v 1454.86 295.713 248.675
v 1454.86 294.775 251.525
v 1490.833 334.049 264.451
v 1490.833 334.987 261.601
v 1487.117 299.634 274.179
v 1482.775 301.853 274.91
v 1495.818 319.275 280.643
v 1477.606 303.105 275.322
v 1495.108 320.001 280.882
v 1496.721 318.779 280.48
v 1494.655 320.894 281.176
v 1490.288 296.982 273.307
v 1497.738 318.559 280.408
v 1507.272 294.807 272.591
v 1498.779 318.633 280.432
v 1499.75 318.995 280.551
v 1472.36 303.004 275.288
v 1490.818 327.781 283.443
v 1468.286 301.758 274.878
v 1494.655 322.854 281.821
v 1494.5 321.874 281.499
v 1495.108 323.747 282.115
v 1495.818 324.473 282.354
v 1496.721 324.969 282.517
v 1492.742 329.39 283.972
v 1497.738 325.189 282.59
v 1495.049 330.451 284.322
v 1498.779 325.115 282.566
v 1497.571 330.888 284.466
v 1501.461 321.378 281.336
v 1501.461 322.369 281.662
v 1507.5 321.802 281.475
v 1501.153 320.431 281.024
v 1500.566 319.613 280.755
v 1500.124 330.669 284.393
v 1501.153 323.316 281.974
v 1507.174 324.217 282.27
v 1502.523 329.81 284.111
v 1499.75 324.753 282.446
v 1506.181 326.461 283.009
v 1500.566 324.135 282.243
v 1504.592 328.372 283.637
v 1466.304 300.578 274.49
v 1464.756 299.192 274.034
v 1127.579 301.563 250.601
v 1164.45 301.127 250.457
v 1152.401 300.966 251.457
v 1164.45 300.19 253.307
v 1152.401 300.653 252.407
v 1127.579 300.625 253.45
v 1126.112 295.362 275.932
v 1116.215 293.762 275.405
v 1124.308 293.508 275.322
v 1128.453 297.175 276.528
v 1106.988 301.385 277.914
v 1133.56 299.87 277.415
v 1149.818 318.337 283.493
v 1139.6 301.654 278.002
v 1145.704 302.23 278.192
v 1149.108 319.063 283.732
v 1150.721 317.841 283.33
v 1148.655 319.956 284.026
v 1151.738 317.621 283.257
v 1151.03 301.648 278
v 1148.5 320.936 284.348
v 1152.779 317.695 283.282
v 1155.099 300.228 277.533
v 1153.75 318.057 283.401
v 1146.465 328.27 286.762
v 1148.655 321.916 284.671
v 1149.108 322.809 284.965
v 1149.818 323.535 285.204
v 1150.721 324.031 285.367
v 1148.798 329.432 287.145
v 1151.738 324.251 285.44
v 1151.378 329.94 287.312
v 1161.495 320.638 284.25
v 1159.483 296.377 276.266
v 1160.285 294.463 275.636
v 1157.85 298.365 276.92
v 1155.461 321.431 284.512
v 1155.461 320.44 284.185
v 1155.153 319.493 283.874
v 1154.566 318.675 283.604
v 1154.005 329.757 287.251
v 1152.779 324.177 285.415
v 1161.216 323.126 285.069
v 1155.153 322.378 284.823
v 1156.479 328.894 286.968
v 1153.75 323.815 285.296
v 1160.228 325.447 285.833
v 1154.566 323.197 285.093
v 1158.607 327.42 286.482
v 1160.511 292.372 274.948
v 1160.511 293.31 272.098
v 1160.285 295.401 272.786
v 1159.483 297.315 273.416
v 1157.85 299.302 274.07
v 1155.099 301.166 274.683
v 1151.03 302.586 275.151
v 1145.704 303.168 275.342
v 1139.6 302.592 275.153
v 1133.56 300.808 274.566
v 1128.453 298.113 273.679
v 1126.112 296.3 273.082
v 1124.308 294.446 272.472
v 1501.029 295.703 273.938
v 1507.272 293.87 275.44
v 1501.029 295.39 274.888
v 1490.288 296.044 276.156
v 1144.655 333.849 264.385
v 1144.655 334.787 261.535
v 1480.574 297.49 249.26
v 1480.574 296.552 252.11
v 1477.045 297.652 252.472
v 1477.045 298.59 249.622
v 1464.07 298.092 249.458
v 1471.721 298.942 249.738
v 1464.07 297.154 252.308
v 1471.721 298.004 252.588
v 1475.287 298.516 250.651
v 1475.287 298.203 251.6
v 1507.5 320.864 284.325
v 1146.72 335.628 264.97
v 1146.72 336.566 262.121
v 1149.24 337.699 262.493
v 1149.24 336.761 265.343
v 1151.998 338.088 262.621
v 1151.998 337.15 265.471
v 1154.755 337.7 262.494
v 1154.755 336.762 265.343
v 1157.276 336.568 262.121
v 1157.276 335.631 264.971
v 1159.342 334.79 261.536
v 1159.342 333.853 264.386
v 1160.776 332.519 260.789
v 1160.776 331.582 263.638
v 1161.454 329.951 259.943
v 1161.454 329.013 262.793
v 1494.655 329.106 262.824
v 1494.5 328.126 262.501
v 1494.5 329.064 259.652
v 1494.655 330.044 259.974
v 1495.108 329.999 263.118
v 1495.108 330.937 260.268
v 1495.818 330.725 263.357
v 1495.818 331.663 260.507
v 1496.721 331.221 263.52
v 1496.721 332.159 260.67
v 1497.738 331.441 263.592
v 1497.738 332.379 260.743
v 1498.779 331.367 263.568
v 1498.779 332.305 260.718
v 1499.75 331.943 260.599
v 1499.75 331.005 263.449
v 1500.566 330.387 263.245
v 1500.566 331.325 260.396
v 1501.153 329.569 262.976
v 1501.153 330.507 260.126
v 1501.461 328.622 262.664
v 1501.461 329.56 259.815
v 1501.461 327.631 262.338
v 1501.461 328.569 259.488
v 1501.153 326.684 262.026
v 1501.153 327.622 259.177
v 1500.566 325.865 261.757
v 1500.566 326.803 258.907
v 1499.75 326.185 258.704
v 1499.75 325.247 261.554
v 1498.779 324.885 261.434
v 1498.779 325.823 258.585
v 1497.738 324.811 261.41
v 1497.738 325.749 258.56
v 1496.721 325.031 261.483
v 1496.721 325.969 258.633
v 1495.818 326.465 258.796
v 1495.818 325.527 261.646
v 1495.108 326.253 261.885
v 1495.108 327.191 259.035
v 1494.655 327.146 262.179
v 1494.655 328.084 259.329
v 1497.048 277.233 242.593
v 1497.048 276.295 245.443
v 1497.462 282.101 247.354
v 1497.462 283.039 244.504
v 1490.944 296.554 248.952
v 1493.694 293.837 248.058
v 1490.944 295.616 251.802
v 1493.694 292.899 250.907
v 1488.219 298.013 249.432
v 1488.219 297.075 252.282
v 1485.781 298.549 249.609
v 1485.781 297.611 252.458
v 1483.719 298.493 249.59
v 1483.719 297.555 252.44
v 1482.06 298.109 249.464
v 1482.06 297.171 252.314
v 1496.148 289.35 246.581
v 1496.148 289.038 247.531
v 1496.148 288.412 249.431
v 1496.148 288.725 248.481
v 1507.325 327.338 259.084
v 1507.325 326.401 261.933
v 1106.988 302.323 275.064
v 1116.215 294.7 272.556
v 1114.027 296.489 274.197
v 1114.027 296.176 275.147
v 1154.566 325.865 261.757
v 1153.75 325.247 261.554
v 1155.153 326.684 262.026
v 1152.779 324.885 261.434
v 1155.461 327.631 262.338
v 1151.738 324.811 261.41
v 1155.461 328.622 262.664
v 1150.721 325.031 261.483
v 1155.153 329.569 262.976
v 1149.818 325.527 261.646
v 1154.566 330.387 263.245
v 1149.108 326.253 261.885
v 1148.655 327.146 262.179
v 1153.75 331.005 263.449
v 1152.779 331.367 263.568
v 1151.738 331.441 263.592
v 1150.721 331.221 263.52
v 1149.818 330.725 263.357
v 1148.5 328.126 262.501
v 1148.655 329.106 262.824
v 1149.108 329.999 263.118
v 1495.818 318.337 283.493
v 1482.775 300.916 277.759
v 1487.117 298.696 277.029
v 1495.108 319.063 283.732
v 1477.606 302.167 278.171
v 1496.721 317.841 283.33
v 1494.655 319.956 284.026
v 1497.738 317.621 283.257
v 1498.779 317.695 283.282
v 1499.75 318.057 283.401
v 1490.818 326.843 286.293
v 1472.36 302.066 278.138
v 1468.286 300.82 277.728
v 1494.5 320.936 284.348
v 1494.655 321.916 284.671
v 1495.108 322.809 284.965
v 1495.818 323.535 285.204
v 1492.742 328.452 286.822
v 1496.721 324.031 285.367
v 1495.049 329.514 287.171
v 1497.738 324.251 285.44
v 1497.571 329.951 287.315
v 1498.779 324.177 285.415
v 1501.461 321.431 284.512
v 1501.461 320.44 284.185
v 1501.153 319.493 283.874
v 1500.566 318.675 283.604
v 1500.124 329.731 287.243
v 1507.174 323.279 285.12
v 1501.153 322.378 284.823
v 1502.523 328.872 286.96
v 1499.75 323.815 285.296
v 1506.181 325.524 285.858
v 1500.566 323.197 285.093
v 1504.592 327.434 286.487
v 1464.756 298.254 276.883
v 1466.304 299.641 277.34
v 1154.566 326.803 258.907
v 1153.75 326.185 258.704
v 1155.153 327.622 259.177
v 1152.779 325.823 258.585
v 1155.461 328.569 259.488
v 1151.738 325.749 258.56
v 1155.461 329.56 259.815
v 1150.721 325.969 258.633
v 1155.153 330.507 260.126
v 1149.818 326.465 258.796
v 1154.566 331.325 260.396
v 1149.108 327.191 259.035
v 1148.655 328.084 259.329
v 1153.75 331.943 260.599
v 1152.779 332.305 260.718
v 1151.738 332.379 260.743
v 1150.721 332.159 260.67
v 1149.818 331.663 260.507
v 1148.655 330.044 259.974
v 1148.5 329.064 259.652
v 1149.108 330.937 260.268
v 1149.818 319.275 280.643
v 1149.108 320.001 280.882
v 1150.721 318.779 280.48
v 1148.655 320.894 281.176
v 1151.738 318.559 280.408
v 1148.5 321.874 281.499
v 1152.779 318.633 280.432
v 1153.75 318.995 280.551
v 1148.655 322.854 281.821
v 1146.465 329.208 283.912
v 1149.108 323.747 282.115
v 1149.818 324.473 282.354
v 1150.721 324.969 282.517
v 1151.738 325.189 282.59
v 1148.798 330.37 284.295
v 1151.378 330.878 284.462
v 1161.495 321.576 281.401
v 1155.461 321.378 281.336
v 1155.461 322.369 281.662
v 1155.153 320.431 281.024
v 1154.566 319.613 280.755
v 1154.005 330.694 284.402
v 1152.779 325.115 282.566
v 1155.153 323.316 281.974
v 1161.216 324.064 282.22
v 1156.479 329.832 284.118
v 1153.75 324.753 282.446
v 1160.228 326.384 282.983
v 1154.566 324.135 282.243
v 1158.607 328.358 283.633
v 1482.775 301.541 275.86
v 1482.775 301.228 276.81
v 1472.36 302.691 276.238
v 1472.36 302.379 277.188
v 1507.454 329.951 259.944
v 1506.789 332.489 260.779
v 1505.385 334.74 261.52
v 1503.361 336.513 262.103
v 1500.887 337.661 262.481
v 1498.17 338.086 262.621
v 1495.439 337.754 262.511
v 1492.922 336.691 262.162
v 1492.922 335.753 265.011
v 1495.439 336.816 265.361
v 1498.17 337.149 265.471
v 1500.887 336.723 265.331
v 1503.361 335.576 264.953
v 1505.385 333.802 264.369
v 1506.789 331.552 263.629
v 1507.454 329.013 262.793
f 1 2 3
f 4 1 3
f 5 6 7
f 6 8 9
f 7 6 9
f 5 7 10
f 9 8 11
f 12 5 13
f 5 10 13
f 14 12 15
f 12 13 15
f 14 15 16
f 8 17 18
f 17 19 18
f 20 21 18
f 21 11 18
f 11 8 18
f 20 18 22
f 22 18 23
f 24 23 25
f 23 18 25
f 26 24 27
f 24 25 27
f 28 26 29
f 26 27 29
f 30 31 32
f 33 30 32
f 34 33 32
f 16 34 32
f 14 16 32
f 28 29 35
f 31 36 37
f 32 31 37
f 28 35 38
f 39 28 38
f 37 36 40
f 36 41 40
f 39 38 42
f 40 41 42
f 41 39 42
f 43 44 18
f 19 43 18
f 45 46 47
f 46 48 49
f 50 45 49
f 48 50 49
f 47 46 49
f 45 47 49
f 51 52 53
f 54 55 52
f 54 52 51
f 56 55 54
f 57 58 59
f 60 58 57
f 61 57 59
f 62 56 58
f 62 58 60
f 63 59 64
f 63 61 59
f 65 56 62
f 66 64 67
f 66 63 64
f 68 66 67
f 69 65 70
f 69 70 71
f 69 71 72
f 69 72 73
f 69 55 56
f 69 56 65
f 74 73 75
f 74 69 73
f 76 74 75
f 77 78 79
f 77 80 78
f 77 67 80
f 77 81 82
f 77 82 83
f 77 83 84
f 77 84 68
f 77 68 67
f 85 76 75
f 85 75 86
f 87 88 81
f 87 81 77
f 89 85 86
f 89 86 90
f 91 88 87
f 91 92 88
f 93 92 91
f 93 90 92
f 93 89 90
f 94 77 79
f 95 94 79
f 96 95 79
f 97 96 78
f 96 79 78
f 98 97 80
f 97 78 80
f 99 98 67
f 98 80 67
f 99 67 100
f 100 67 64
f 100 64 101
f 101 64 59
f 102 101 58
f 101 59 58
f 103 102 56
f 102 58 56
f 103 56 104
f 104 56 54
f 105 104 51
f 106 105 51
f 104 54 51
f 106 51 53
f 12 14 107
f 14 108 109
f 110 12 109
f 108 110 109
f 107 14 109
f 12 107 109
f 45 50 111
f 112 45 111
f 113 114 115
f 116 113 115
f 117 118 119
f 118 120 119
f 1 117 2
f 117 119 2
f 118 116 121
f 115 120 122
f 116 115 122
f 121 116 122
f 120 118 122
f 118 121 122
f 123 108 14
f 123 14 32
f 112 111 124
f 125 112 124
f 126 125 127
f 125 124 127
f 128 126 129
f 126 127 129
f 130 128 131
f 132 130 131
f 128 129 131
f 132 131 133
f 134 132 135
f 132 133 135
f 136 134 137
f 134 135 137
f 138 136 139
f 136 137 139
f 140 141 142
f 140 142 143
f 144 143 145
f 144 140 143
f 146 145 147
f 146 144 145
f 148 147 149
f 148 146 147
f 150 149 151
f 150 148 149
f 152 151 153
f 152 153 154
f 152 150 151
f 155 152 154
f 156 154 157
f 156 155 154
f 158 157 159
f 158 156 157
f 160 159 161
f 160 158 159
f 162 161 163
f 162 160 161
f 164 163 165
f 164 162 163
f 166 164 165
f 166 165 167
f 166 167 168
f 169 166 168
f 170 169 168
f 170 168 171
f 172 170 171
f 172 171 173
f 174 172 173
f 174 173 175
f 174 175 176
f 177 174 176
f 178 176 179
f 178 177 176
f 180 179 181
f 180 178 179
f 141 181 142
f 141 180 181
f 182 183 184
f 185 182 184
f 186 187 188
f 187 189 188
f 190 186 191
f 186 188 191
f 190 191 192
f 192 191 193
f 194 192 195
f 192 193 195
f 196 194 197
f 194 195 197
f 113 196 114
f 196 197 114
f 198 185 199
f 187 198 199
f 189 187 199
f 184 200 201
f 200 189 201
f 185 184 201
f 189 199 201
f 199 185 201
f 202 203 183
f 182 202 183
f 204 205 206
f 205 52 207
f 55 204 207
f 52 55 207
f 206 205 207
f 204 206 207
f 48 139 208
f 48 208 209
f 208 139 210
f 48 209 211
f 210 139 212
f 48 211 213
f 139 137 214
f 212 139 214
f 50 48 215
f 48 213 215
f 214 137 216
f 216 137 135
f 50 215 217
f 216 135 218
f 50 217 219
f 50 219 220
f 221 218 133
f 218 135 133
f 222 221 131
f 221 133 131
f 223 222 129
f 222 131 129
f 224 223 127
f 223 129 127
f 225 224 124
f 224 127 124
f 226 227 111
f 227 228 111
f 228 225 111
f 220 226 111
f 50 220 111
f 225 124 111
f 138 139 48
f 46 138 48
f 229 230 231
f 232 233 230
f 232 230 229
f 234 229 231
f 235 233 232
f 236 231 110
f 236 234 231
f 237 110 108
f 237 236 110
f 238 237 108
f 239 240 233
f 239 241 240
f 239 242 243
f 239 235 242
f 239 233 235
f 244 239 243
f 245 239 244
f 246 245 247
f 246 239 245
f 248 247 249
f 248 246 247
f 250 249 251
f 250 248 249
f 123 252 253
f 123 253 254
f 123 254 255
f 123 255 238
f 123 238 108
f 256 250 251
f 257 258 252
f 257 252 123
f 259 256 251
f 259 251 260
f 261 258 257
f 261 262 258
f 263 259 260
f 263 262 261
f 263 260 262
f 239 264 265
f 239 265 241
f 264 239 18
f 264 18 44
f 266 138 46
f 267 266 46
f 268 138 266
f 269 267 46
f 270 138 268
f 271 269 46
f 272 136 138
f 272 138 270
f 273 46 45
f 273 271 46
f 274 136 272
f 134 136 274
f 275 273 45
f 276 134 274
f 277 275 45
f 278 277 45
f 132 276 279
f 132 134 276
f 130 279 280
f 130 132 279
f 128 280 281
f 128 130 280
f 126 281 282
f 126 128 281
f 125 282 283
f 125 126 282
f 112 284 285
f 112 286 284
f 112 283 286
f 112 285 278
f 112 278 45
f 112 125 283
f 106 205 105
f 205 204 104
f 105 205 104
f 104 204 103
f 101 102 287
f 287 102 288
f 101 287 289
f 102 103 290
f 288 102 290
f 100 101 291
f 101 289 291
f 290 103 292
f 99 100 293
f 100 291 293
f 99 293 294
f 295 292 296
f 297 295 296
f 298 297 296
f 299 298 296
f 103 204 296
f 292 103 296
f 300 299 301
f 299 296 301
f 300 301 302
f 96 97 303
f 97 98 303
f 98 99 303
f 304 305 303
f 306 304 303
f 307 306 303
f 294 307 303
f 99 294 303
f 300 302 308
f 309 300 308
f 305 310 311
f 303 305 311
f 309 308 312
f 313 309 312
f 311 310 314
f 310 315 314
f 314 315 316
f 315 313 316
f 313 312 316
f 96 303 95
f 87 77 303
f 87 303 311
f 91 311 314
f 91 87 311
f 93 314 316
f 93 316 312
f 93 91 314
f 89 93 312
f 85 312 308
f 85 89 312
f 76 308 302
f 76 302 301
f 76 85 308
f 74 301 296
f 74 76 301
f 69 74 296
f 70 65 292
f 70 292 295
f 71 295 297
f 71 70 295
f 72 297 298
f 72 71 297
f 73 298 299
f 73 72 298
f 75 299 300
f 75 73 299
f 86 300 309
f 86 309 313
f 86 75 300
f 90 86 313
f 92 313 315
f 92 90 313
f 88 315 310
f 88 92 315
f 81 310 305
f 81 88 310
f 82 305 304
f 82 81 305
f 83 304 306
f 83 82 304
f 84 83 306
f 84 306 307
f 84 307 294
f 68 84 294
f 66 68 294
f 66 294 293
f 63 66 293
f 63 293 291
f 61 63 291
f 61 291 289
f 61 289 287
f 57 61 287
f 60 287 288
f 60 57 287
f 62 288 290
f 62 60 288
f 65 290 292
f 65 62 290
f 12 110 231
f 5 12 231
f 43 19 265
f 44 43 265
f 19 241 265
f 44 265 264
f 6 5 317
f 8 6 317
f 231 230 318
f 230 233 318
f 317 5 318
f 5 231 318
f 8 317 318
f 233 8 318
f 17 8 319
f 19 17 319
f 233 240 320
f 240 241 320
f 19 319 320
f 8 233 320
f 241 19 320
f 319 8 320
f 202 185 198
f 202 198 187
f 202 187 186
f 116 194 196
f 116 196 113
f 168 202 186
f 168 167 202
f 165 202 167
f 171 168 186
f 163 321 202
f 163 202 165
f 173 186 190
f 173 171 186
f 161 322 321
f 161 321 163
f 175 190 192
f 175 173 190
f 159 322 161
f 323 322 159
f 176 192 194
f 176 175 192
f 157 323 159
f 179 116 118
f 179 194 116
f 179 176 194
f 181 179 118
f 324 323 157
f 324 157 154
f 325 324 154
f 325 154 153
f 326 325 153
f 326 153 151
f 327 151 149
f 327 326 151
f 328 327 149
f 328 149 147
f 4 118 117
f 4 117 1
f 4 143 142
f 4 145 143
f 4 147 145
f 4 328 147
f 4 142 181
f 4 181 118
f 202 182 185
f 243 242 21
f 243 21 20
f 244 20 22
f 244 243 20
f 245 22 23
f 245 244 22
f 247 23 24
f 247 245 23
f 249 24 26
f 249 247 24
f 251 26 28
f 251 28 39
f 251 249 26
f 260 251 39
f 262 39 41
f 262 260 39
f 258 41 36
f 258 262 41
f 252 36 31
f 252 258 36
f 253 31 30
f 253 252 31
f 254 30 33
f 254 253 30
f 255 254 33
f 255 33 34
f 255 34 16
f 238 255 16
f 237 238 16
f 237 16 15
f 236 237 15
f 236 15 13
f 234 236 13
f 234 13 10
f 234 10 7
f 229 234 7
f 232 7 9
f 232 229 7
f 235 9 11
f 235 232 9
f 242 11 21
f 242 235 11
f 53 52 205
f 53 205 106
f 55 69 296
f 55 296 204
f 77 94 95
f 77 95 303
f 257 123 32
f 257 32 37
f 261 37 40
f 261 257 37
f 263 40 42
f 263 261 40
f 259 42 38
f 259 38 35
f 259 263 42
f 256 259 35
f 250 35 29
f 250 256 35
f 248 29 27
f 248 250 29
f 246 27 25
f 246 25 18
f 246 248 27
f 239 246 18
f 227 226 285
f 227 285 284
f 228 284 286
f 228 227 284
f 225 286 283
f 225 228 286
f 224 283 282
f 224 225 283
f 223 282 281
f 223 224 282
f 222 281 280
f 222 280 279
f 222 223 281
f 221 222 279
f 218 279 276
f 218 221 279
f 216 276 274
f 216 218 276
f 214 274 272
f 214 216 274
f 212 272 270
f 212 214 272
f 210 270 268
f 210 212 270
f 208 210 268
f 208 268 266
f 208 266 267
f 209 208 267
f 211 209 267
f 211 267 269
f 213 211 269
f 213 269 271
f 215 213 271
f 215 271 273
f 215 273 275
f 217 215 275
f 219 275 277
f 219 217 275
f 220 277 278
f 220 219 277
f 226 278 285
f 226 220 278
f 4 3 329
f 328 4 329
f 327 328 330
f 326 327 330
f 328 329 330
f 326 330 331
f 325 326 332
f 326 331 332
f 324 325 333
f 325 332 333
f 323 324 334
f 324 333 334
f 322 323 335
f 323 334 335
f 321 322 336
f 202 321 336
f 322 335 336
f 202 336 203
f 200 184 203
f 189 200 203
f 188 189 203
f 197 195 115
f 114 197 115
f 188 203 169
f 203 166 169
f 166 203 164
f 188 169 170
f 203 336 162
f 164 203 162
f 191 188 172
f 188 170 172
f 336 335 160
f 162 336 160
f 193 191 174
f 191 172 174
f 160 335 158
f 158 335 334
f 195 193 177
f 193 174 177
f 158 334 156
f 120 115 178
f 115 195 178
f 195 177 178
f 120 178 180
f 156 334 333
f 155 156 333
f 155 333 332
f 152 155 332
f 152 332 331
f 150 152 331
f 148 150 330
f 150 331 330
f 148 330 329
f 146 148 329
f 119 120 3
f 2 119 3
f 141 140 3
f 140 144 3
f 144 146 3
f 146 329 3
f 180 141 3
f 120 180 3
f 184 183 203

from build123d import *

# Parameters (mm, degrees)
SZKIC1_R                      = 3.5
DODANIE_WYCI_GNI_CIE1_DEPTH   = 3
DODANIE_WYCI_GNI_CIE1_2_DEPTH = 3
SZKIC2_R                      = 3.5
DODANIE_WYCI_GNI_CIE2_DEPTH   = 3
DODANIE_WYCI_GNI_CIE2_2_DEPTH = 3


with BuildPart() as part:
    # Szkic1 → Dodanie-wyciągnięcie1 (new body)
    with BuildSketch(Plane(origin=(0, -45.881759644, 139.410201522), x_dir=(-1, 0, 0), z_dir=(0, 0.312617861, -0.949878978))):
        with BuildLine():
            Line((-1507.324679486, 391.926038808), (-1497.047683756, 339.176346736))
            add(Edge.make_bspline(
                [(-1497.047683756, 339.176346736), (-1500.295889417, 355.848714116), (-1491.071283731, 366.144487415), (-1480.574167069, 360.502687303)],
                knots=[0.562260196, 0.562260196, 0.562260196, 0.562260196, 1, 1, 1, 1], degree=3, weights=[0.855160957, 0.563995223, 0.612274904, 1]))
            add(Edge.make_bspline(
                [(-1480.574167069, 360.502687303), (-1475.881961605, 362.950113366), (-1466.864587333, 362.760048919), (-1454.859781154, 358.631833208)],
                knots=[0.566884898, 0.566884898, 0.566884898, 0.566884898, 0.725491645, 0.725491645, 0.725491645, 0.725491645], degree=3, weights=[0.768249126, 0.613351575, 0.525536958, 0.504805276]))
            Line((-1454.859781154, 358.631833208), (-1490.832934288, 399.978363049))
            ThreePointArc((-1490.832934288, 399.978363049), (-1502.168189741, 402.279481514), (-1507.324679486, 391.926038808))
        make_face()
        with Locations((-1497.999999998, 393.742726025)):
            Circle(SZKIC1_R, mode=Mode.SUBTRACT)
    extrude(amount=DODANIE_WYCI_GNI_CIE1_DEPTH)


with BuildPart() as body_2:
    # Szkic1 → Dodanie-wyci_gni_cie1 2 (new body)
    with BuildSketch(Plane(origin=(0, -45.881759644, 139.410201522), x_dir=(-1, 0, 0), z_dir=(0, 0.312617861, -0.949878978))):
        with BuildLine():
            Line((-1161.454019497, 394.676275891), (-1164.450401157, 364.332047192))
            add(Edge.make_bspline(
                [(-1164.450401157, 364.332047192), (-1152.611051852, 364.492579355), (-1140.312798139, 364.64531969), (-1127.578994798, 364.790268273)],
                knots=[0.951482823, 0.951482823, 0.951482823, 0.951482823, 1, 1, 1, 1], degree=3, weights=[0.978494801, 0.985297676, 0.992466075, 1]))
            Line((-1127.578994798, 364.790268273), (-1144.654879263, 399.767607879))
            ThreePointArc((-1144.654879263, 399.767607879), (-1154.755409017, 402.834355205), (-1161.454019497, 394.676275891))
        make_face()
        with Locations((-1152, 393.742726025)):
            Circle(SZKIC1_R, mode=Mode.SUBTRACT)
    extrude(amount=DODANIE_WYCI_GNI_CIE1_2_DEPTH)


with BuildPart() as body_3:
    # Szkic2 → Dodanie-wyciągnięcie2 (new body)
    with BuildSketch(Plane(origin=(0, -53.071970442, 161.257418019), x_dir=(-1, 0, 0), z_dir=(0, 0.312617861, -0.949878978))):
        with BuildLine():
            Line((-1146.464512352, 401.463372144), (-1106.988460457, 373.160145407))
            add(Edge.make_bspline(
                [(-1116.21528424, 365.135364776), (-1114.294169782, 367.270410001), (-1111.261896249, 369.936504078), (-1106.988460457, 373.160145407)],
                knots=[0.553642055, 0.553642055, 0.553642055, 0.553642055, 0.604482392, 0.604482392, 0.604482392, 0.604482392], degree=3, weights=[0.815243898, 0.763889723, 0.719183774, 0.681126049]))
            Line((-1116.21528424, 365.135364776), (-1124.308276373, 364.867875963))
            add(Edge.make_bspline(
                [(-1160.511269619, 363.671298048), (-1160.5381986, 364.486046247), (-1160.446549462, 365.259098088), (-1160.25609924, 365.985762148), (-1157.225619941, 377.548575622), (-1137.029655801, 380.912629744), (-1124.308276373, 364.867875963)],
                knots=[0.957482723, 0.957482723, 0.957482723, 0.957482723, 1, 1, 1, 1.36661687, 1.36661687, 1.36661687, 1.36661687], degree=3, weights=[0.844392641, 0.891441177, 0.943310297, 1, 0.511177507, 0.380776158, 0.608795955]))
            Line((-1160.511269619, 363.671298048), (-1161.494815212, 393.428904288))
            ThreePointArc((-1161.494815212, 393.428904288), (-1156.478530687, 402.120838156), (-1146.464512352, 401.463372144))
        make_face()
        with Locations((-1152, 393.742726025)):
            Circle(SZKIC2_R, mode=Mode.SUBTRACT)
    extrude(amount=DODANIE_WYCI_GNI_CIE2_DEPTH)


with BuildPart() as body_4:
    # Szkic2 → Dodanie-wyci_gni_cie2 2 (new body)
    with BuildSketch(Plane(origin=(0, -53.071970442, 161.257418019), x_dir=(-1, 0, 0), z_dir=(0, 0.312617861, -0.949878978))):
        with BuildLine():
            Line((-1490.818309173, 399.961513437), (-1464.75604489, 369.863825275))
            add(Edge.make_bspline(
                [(-1490.288359321, 367.537665914), (-1482.924639067, 375.68919221), (-1471.160621906, 377.260072958), (-1464.75604489, 369.863825275)],
                knots=[0, 0, 0, 0, 0.854312736, 0.854312736, 0.854312736, 0.854312736], degree=3, weights=[1, 0.699634369, 0.655874922, 0.868721659]))
            add(Edge.make_bspline(
                [(-1507.271943481, 365.248099091), (-1501.112829495, 366.729517203), (-1495.333465921, 367.467322117), (-1490.288359321, 367.537665914)],
                knots=[0.829977, 0.829977, 0.829977, 0.829977, 0.944345935, 0.944345935, 0.944345935, 0.944345935], degree=3, weights=[0.725470626, 0.755309292, 0.806482945, 0.878991584]))
            Line((-1507.271943481, 365.248099091), (-1507.499694933, 393.666593585))
            ThreePointArc((-1507.499694933, 393.666593585), (-1501.354070622, 402.630932269), (-1490.818309173, 399.961513437))
        make_face()
        with Locations((-1497.999999998, 393.742726025)):
            Circle(SZKIC2_R, mode=Mode.SUBTRACT)
    extrude(amount=DODANIE_WYCI_GNI_CIE2_2_DEPTH)


solid = Compound([part.part, body_2.part, body_3.part, body_4.part])
